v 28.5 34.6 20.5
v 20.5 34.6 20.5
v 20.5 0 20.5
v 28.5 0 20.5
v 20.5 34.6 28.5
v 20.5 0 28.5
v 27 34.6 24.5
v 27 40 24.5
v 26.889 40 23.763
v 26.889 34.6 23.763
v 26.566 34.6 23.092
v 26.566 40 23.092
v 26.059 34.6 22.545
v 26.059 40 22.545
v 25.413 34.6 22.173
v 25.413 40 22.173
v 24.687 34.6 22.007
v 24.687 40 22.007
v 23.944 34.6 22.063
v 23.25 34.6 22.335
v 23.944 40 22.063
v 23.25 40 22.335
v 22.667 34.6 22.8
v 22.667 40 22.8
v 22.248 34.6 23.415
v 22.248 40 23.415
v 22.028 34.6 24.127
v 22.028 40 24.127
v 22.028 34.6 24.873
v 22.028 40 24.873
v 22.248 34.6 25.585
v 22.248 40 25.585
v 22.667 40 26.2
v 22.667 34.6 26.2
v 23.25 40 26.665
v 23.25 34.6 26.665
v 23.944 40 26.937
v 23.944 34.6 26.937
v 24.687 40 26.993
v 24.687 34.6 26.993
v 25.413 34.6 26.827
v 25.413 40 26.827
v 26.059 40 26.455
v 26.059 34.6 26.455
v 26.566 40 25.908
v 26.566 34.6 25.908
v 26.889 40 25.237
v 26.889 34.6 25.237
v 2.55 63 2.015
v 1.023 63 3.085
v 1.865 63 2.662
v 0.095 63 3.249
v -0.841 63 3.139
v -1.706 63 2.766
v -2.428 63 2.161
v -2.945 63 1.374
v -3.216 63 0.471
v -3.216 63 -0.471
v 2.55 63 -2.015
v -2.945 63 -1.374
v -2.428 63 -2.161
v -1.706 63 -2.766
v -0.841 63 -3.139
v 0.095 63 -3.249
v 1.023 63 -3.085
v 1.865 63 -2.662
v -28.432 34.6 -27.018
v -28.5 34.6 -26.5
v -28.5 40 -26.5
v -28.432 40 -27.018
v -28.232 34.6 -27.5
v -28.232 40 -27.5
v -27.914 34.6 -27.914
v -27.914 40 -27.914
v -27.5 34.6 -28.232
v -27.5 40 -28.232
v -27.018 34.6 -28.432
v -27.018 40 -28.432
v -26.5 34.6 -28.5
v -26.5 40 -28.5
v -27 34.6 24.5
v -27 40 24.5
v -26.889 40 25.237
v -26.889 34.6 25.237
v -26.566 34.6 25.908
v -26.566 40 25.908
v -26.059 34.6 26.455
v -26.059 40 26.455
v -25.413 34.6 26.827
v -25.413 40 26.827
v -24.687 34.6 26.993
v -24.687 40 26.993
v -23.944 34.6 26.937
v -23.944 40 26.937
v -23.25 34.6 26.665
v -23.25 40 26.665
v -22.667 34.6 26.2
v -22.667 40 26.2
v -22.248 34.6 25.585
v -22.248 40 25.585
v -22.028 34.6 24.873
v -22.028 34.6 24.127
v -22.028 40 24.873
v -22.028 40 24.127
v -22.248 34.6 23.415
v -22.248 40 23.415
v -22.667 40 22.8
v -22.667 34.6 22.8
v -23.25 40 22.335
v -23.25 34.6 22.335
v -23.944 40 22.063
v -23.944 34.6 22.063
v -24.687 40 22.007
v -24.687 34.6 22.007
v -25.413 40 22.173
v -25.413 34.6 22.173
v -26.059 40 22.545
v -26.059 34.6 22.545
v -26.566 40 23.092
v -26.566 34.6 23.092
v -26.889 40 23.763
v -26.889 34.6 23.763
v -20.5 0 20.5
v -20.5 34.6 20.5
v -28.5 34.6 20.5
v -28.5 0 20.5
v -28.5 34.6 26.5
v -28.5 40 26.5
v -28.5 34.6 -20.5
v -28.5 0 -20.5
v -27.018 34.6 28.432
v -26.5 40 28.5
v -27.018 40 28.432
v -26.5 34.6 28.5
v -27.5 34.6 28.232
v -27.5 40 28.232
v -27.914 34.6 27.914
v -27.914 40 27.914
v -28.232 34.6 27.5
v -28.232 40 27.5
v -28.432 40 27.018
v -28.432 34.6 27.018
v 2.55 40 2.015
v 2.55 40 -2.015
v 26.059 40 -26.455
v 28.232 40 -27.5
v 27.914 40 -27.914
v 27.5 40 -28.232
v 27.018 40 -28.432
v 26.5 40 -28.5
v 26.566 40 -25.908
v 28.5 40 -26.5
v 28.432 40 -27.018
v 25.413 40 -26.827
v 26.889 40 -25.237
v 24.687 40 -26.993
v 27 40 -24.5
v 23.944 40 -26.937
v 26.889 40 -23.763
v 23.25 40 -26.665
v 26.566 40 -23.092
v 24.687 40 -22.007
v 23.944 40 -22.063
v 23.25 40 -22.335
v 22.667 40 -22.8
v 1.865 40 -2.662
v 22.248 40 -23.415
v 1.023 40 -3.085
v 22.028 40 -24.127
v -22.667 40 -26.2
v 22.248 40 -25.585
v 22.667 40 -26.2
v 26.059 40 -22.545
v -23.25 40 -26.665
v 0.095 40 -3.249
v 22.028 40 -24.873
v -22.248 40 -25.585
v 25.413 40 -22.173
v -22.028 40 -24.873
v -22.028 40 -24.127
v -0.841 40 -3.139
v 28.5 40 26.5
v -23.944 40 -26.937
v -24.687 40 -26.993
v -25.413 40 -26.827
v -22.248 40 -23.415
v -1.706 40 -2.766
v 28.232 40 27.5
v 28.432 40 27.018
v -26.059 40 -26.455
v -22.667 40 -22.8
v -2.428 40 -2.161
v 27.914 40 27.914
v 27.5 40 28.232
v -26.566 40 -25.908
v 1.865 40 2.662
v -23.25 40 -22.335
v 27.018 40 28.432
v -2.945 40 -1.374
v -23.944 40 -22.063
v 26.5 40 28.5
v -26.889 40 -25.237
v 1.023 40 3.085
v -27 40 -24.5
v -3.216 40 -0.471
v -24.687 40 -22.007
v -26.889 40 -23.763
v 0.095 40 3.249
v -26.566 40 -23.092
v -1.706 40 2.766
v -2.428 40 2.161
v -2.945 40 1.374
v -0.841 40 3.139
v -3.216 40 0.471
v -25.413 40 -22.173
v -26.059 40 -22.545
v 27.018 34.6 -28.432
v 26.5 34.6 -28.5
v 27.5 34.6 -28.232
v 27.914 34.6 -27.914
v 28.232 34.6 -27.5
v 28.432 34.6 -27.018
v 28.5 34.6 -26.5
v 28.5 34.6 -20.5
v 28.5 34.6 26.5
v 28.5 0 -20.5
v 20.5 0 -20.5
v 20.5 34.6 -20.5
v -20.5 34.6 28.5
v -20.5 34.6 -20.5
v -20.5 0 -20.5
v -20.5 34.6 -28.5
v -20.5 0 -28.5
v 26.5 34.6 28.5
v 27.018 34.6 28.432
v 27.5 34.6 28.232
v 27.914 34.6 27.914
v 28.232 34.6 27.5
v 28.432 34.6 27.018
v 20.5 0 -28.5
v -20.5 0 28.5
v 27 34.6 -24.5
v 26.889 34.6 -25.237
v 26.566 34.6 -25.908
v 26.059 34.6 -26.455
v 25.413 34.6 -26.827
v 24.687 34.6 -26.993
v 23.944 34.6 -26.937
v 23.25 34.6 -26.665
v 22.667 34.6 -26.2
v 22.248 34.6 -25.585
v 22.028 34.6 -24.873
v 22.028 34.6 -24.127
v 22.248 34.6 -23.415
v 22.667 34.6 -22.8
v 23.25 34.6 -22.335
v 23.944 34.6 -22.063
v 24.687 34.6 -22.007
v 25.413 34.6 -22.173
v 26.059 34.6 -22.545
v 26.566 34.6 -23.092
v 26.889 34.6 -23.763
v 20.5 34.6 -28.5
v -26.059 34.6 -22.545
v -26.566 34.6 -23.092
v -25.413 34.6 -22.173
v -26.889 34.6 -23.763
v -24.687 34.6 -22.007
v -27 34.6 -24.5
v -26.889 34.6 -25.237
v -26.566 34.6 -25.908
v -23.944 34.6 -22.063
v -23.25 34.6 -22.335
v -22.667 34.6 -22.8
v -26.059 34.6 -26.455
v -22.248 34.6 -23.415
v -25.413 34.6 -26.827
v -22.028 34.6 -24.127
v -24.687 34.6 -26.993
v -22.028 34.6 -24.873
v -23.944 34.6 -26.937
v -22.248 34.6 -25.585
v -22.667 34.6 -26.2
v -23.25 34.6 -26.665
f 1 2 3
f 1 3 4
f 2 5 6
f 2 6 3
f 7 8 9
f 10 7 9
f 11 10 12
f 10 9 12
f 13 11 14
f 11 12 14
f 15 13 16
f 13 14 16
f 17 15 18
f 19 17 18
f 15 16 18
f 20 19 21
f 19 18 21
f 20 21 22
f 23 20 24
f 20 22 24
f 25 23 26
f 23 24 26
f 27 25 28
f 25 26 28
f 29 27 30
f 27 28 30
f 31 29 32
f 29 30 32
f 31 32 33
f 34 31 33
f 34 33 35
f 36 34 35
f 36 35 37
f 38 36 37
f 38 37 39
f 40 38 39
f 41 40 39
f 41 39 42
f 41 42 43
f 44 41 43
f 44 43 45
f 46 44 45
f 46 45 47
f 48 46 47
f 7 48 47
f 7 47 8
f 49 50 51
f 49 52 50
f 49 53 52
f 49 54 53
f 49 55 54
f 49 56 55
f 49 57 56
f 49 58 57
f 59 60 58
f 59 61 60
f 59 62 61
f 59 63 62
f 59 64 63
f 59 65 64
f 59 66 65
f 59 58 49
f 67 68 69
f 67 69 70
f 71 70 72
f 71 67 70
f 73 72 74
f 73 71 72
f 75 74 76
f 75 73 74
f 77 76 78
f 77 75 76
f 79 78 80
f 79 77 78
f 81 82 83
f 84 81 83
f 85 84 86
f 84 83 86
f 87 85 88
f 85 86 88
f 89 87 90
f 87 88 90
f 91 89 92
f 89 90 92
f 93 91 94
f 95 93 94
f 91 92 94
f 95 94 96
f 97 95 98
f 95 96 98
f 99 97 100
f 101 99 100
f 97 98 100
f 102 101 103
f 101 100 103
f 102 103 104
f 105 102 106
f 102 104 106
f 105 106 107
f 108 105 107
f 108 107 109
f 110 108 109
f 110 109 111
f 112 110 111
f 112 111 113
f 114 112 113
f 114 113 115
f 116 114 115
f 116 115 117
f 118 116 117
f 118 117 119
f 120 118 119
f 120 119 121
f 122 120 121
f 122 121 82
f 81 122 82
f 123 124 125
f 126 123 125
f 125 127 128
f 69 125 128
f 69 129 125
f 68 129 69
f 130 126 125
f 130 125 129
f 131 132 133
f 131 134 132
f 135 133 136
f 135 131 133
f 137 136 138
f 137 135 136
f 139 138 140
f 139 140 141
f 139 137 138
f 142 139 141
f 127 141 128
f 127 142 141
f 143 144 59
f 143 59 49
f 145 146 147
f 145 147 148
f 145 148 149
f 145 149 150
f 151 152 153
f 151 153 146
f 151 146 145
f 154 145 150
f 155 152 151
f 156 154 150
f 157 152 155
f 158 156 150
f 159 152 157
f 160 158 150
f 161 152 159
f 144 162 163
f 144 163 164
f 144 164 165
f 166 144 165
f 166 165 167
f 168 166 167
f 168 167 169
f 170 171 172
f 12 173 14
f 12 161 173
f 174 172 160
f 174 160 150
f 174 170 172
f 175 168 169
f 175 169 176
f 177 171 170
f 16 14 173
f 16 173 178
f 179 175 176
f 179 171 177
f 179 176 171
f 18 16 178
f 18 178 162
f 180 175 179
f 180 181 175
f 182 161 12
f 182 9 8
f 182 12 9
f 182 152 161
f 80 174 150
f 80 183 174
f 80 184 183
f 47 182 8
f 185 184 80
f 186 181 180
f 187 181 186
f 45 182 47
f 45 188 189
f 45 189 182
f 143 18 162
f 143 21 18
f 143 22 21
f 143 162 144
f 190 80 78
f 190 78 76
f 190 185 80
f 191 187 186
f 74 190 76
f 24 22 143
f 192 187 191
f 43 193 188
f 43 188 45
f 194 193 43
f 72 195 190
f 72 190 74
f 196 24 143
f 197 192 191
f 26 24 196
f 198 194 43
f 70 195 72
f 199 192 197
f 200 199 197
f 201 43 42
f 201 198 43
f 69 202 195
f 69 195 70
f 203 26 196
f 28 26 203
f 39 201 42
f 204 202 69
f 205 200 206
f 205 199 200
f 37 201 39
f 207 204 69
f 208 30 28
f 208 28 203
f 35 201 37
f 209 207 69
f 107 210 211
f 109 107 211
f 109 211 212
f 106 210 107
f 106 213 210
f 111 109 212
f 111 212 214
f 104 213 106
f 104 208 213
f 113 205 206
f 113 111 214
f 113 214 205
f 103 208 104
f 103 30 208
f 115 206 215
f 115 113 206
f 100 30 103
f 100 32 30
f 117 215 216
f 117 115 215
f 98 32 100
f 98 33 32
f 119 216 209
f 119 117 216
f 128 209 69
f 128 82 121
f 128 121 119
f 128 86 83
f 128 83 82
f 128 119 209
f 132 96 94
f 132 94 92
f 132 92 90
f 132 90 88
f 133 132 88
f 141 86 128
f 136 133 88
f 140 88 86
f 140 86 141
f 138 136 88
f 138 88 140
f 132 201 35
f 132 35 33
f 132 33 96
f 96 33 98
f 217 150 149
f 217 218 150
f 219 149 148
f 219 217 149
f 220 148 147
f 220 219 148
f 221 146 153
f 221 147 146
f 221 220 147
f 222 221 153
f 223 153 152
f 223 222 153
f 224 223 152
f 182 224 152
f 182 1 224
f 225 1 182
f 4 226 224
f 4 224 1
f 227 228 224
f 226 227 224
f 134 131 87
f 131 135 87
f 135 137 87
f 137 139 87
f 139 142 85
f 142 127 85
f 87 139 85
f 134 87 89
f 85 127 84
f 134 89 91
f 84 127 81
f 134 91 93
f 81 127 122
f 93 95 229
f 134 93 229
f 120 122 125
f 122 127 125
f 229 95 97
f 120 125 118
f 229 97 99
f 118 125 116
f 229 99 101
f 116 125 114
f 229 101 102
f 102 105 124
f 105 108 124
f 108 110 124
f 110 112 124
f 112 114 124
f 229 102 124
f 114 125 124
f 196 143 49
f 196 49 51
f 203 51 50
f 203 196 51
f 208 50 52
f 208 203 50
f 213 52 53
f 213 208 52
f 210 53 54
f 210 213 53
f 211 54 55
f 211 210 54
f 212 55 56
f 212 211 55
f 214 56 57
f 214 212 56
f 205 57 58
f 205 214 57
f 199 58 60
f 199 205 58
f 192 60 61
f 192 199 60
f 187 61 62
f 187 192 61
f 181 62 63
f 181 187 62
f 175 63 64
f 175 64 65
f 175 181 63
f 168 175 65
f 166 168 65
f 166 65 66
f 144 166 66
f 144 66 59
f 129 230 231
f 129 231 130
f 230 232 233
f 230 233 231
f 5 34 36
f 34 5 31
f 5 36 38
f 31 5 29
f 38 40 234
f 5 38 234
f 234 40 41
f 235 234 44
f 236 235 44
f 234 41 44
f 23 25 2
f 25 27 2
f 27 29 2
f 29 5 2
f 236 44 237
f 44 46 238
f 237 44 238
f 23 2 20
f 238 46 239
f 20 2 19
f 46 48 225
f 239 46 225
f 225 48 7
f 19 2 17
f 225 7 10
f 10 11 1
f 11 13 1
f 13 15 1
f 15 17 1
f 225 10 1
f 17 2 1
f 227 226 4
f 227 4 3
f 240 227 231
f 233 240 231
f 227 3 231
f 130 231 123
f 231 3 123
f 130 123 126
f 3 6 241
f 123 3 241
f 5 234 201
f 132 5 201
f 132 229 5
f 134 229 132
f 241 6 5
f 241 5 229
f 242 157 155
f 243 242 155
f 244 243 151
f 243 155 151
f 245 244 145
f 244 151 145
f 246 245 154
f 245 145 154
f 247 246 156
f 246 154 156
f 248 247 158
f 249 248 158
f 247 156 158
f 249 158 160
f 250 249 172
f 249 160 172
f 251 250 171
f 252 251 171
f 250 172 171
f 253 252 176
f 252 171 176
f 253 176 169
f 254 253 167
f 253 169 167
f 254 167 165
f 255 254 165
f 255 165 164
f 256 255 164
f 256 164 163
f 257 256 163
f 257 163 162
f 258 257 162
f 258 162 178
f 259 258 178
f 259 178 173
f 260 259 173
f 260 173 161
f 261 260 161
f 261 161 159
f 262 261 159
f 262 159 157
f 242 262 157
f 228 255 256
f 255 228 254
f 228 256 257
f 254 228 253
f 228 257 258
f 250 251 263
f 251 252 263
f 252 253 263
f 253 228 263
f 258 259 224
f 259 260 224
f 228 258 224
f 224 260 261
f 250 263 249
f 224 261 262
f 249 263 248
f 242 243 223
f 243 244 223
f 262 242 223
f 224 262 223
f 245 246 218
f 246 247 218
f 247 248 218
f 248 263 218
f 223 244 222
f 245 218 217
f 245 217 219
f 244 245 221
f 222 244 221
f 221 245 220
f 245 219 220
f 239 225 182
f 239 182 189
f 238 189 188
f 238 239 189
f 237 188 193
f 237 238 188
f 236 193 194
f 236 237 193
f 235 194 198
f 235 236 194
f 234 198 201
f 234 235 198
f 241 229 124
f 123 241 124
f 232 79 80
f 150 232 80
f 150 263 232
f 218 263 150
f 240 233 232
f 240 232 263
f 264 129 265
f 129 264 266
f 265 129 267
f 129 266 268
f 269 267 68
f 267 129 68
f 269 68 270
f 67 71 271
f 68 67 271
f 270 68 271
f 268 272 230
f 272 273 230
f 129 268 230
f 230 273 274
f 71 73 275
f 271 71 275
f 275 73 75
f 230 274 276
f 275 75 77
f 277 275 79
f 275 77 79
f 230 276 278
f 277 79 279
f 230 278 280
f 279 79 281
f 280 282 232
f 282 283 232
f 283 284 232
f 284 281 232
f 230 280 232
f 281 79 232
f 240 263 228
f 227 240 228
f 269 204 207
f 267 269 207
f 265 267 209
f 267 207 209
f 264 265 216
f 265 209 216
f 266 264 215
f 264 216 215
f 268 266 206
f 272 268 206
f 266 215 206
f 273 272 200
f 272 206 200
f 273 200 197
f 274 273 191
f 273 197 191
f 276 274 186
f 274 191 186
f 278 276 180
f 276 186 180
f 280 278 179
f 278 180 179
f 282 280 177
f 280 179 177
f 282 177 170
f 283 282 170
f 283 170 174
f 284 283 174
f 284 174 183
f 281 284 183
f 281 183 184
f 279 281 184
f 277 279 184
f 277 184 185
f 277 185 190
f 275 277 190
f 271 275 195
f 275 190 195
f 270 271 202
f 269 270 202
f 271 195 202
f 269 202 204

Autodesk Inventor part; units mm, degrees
ref_plane "YZ Plane" through (0, 0, 0) normal (1, 0, 0) x (0, 1, 0)
ref_plane "XZ Plane" through (0, 0, 0) normal (0, 1, 0) x (-1, 0, 0)
ref_plane "XY Plane" through (0, 0, 0) normal (0, 0, 1) x (1, 0, 0)
sketch "Sketch1" plane through (0, 0, 0) normal (0, 1, 0) x (-1, 0, 0)
  line L0 (-28.5, 28.5) -> (28.5, 28.5)
  line L1 (28.5, 28.5) -> (28.5, -28.5)
  line L2 (28.5, -28.5) -> (-28.5, -28.5)
  line L3 (-28.5, -28.5) -> (-28.5, 28.5)
  line L4 (-28.5, 28.5) -> (28.5, -28.5) construction
  line L5 (28.5, 28.5) -> (-28.5, -28.5) construction
  line L6 (28.5, -28.5) -> (20.5, -28.5)
  line L7 (20.5, -28.5) -> (20.5, -20.5)
  line L8 (20.5, -20.5) -> (28.5, -20.5)
  line L9 (28.5, -20.5) -> (28.5, -28.5)
  line L10 (-28.5, -28.5) -> (-22.5, -28.5)
  line L11 (-22.5, -28.5) -> (-22.5, -20.5)
  line L12 (-22.5, -20.5) -> (-28.5, -20.5)
  line L13 (-28.5, -20.5) -> (-28.5, -28.5)
  line L14 (-28.5, 28.5) -> (-20.5, 28.5)
  line L15 (-20.5, 28.5) -> (-20.5, 20.5)
  line L16 (-20.5, 20.5) -> (-28.5, 20.5)
  line L17 (-28.5, 20.5) -> (-28.5, 28.5)
  line L18 (28.5, 28.5) -> (20.5, 28.5)
  line L19 (20.5, 28.5) -> (20.5, 20.5)
  line L20 (20.5, 20.5) -> (28.5, 20.5)
  line L21 (28.5, 20.5) -> (28.5, 28.5)
  line L22 (-28.5, -28.5) -> (-20.5, -28.5)
  line L23 (-20.5, -28.5) -> (-20.5, -20.5)
  line L24 (-20.5, -20.5) -> (-28.5, -20.5)
  line L25 (-28.5, -20.5) -> (-28.5, -28.5)
  point P0 (0, 0)
  point P1 (28.5, 20.5)
  point P2 (20.5, 28.5)
  point P3 (-20.5, 28.5)
  point P4 (-28.5, 20.5)
  point P5 (-28.5, -20.5)
  point P6 (20.5, -28.5)
  dimension "d0" = 57
  dimension "d1" = 57
  dimension "d2" = 8
  dimension "d3" = 8
  dimension "d4" = 6
  dimension "d5" = 8
  dimension "d6" = 8
  dimension "d7" = 8
  dimension "d8" = 8
  dimension "d9" = 8
  dimension "d19" = 8
  dimension "d20" = 8
extrude "Extrusion1" add sketch "Sketch1" along normal blind 40 contours L0 L19 L20 L1 L8 L7 L2 L23 L24 L12 L3 L16 L15
sketch "Sketch2" plane through (0, 40, 0) normal (0, 1, 0) x (1, 0, 0)
  line L0 (-20.5, -20.5) -> (-20.5, -28.5) projected
  line L1 (-20.5, -28.5) -> (20.5, -28.5) projected
  line L2 (20.5, -28.5) -> (20.5, -20.5) projected
  line L3 (20.5, -20.5) -> (28.5, -20.5) projected
  line L4 (28.5, -20.5) -> (28.5, 20.5) projected
  line L5 (28.5, 20.5) -> (20.5, 20.5) projected
  line L6 (20.5, 28.5) -> (-20.5, 28.5) projected
  line L7 (-20.5, 28.5) -> (-20.5, 20.5) projected
  line L8 (-20.5, 20.5) -> (-28.5, 20.5) projected
  line L9 (-28.5, 20.5) -> (-28.5, -20.5) projected
  line L10 (-28.5, -20.5) -> (-20.5, -20.5) projected
  circle A0 centre (0, 0) radius 3.25
  line L11 (20.5, 20.5) -> (20.5, 28.5) projected
  line L12 (-3.25, 0) -> (2.55, 0)
  line L13 (2.55, 2.0149) -> (2.55, -2.0149)
  dimension "d12" = 6.5
  dimension "d24" = 5.8
extrude "Extrusion2" add sketch "Sketch2" along normal blind 23 contours L13 L12 A0 | A0 L12 L13
sketch "Sketch3" plane through (0, 40, 0) normal (0, 1, 0) x (1, 0, 0)
  arc A0 (2.55, 2.0149) -> (2.55, -2.0149) centre (0, 0) ccw projected
  line L0 (-20.5, -20.5) -> (-20.5, -28.5) projected
  line L1 (-20.5, -28.5) -> (20.5, -28.5) projected
  line L2 (20.5, -28.5) -> (20.5, -20.5) projected
  line L3 (20.5, -20.5) -> (28.5, -20.5) projected
  line L4 (28.5, -20.5) -> (28.5, 20.5) projected
  line L5 (28.5, 20.5) -> (20.5, 20.5) projected
  line L6 (20.5, 28.5) -> (-20.5, 28.5) projected
  line L7 (-20.5, 28.5) -> (-20.5, 20.5) projected
  line L8 (-20.5, 20.5) -> (-28.5, 20.5) projected
  line L9 (-28.5, 20.5) -> (-28.5, -20.5) projected
  line L10 (-28.5, -20.5) -> (-20.5, -20.5) projected
  line L11 (-28.5, -28.5) -> (28.5, -28.5)
  line L12 (28.5, -28.5) -> (28.5, 28.5)
  line L13 (28.5, 28.5) -> (-28.5, 28.5)
  line L14 (-28.5, 28.5) -> (-28.5, -28.5)
  line L15 (20.5, 20.5) -> (20.5, 28.5) projected
  line L16 (2.55, 2.0149) -> (2.55, -2.0149) projected
  point P0 (-28.5, 20.5)
  point P1 (-28.5, -20.5)
  point P2 (-20.5, -28.5)
  point P3 (20.5, -28.5)
  point P4 (28.5, -20.5)
  point P5 (28.5, 20.5)
extrude "Extrusion3" add sketch "Sketch3" against normal blind 5.4 contours L16 A0 | L10 L9 L8 L7 L6 L15 L5 L4 L3 L2 L1 L0 | L0 L11 L14 L10 | L2 L3 L12 L11 | L14 L13 L7 L8 | L5 L15 L13 L12
fillet "Fillet1" radius 2 4 edges at (28.5, 37.3, 28.5) (-28.5, 37.3, 28.5) (-28.5, 37.3, -28.5) (28.5, 37.3, -28.5)
sketch "Sketch4" plane through (0, 40, 0) normal (0, 1, 0) x (1, 0, 0)
  line L0 (-20.5, 20.5) -> (-28.5, 20.5) projected
  line L1 (-20.5, 28.5) -> (-20.5, 20.5) projected
  line L2 (20.5, 28.5) -> (-20.5, 28.5) projected
  line L3 (28.5, 20.5) -> (20.5, 20.5) projected
  line L4 (28.5, -20.5) -> (28.5, 20.5) projected
  line L5 (20.5, -20.5) -> (28.5, -20.5) projected
  line L6 (20.5, -28.5) -> (20.5, -20.5) projected
  line L7 (-20.5, -28.5) -> (20.5, -28.5) projected
  line L8 (-20.5, -20.5) -> (-20.5, -28.5) projected
  line L9 (-28.5, -20.5) -> (-20.5, -20.5) projected
  line L10 (-28.5, 20.5) -> (-28.5, -20.5) projected
  line L11 (20.5, -20.5) -> (28.5, -20.5) projected
  line L12 (20.5, -20.5) -> (28.5, -20.5)
  line L13 (28.5, -20.5) -> (28.5, -28.5)
  line L14 (28.5, -28.5) -> (20.5, -28.5)
  line L15 (20.5, -28.5) -> (20.5, -20.5)
  line L16 (20.5, 20.5) -> (20.5, 28.5) projected
  circle A0 centre (24.5, -24.5) radius 2.5
  point P0 (0, 0)
  dimension "d21" = 5
extrude "Extrusion4" cut sketch "Sketch4" against normal blind 40 contours A0
ref_plane "Work Plane1" through (0, 0, 20.5) normal (1, 0, 0) x (0, 0, -1)
ref_plane "Work Plane2" through (20.5, 0, 0) normal (0, 0, -1) x (-1, 0, 0)
mirror "Mirror1" about plane through (0, 0, 20.5) normal (1, 0, 0) of "Extrusion4"
mirror "Mirror2" about plane through (20.5, 0, 0) normal (0, 0, -1) of "Extrusion4", "Mirror1"
properties part number "Motor"
